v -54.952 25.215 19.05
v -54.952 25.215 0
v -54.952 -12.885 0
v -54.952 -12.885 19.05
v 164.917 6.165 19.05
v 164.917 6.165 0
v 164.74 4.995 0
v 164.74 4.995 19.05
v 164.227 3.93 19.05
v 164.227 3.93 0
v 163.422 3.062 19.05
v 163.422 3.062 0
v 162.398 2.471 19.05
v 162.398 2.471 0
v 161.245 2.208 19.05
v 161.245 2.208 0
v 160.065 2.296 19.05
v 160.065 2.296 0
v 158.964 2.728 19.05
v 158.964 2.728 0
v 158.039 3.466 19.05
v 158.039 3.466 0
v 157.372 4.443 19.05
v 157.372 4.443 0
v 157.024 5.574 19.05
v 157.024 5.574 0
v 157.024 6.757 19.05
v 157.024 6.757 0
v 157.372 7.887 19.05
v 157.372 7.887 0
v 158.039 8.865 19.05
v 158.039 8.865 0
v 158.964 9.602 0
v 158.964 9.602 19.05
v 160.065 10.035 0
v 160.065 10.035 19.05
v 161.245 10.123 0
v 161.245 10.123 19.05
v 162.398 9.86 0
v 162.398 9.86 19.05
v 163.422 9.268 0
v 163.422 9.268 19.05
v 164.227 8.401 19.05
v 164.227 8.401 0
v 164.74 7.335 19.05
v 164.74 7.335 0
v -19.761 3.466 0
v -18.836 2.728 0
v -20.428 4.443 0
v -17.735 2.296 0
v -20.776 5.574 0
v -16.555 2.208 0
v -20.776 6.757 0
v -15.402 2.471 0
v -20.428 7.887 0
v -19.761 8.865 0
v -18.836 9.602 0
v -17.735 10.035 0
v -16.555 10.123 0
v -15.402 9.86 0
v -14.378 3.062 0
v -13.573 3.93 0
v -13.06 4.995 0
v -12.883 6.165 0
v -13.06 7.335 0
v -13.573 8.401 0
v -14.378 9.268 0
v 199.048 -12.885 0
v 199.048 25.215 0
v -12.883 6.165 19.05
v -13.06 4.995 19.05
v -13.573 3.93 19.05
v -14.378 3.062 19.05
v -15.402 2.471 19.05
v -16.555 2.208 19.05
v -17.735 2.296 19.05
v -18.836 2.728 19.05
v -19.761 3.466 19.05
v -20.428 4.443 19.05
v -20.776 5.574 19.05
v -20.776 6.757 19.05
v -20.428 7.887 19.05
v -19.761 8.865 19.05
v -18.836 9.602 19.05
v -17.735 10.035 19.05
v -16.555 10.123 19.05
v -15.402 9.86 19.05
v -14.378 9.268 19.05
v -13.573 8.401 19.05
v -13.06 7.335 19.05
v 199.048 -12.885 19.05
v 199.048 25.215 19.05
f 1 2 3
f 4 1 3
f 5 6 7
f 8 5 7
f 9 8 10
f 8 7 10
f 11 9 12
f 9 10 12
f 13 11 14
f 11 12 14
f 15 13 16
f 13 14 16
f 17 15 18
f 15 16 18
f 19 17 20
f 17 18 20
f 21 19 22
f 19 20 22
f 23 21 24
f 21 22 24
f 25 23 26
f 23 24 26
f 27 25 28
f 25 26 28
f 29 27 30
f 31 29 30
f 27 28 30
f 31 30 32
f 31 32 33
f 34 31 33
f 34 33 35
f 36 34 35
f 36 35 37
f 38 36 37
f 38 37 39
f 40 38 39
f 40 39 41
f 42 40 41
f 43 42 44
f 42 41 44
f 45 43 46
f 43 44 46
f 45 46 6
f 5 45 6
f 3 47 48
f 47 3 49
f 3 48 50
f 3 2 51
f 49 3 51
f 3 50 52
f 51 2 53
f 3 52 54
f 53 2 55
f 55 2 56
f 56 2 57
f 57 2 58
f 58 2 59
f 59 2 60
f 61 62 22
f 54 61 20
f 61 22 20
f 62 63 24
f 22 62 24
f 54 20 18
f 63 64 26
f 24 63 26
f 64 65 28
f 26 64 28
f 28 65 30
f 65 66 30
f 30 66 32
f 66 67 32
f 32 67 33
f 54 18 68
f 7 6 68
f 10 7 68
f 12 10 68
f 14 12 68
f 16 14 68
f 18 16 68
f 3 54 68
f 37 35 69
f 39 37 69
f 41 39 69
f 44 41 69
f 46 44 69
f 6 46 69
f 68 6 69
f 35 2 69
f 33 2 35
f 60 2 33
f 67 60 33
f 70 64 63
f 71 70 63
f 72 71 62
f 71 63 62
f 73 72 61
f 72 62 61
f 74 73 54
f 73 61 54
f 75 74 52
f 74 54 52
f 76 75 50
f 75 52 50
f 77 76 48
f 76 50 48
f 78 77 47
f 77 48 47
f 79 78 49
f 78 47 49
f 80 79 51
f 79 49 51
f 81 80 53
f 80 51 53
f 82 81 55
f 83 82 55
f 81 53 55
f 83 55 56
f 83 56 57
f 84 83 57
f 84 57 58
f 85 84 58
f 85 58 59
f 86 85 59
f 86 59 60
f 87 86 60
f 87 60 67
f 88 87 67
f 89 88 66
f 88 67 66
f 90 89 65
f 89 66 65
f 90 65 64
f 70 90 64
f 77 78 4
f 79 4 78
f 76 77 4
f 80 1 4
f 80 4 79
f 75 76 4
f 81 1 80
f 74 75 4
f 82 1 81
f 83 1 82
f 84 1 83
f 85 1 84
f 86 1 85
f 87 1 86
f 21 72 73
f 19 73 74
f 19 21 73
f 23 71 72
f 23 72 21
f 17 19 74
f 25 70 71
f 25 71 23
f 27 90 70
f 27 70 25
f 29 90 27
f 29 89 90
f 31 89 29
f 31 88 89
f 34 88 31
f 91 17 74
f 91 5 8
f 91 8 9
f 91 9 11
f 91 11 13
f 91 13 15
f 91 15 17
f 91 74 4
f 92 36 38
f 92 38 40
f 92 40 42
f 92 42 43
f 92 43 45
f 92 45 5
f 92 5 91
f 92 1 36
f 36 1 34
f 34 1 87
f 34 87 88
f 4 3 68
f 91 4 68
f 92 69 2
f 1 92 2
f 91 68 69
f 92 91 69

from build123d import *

# Parameters (mm, degrees)
BOSS_EXTRUDE2_DEPTH = 19.05


with BuildPart() as part:
    # Sketch1 → Boss-Extrude2 (new body)
    with BuildSketch(Plane.XY):
        with BuildLine():
            ThreePointArc((-20.820795526, 6.165281251), (-16.852045526, 10.134031251), (-12.883295526, 6.165281251))
            Line((-12.883295526, 6.165281251), (72.047954474, 6.165281251))
            Line((72.047954474, 6.165281251), (156.979204474, 6.165281251))
            ThreePointArc((156.979204474, 6.165281251), (160.947954474, 10.134031251), (164.916704474, 6.165281251))
            Line((164.916704474, 6.165281251), (199.047954474, 6.165281251))
            Line((199.047954474, 6.165281251), (199.047954474, 25.215281251))
            Line((199.047954474, 25.215281251), (-54.952045526, 25.215281251))
            Line((-54.952045526, 25.215281251), (-54.952045526, 6.165281251))
            Line((-54.952045526, 6.165281251), (-20.820795526, 6.165281251))
        make_face()
        with BuildLine():
            Line((72.047954474, 6.165281251), (-12.883295526, 6.165281251))
            ThreePointArc((-12.883295526, 6.165281251), (-16.852045526, 2.196531251), (-20.820795526, 6.165281251))
            Line((-20.820795526, 6.165281251), (-54.952045526, 6.165281251))
            Line((-54.952045526, 6.165281251), (-54.952045526, -12.884718749))
            Line((-54.952045526, -12.884718749), (199.047954474, -12.884718749))
            Line((199.047954474, -12.884718749), (199.047954474, 6.165281251))
            Line((199.047954474, 6.165281251), (164.916704474, 6.165281251))
            ThreePointArc((164.916704474, 6.165281251), (160.947954474, 2.196531251), (156.979204474, 6.165281251))
            Line((156.979204474, 6.165281251), (72.047954474, 6.165281251))
        make_face()
    extrude(amount=BOSS_EXTRUDE2_DEPTH)


solid = part.part
